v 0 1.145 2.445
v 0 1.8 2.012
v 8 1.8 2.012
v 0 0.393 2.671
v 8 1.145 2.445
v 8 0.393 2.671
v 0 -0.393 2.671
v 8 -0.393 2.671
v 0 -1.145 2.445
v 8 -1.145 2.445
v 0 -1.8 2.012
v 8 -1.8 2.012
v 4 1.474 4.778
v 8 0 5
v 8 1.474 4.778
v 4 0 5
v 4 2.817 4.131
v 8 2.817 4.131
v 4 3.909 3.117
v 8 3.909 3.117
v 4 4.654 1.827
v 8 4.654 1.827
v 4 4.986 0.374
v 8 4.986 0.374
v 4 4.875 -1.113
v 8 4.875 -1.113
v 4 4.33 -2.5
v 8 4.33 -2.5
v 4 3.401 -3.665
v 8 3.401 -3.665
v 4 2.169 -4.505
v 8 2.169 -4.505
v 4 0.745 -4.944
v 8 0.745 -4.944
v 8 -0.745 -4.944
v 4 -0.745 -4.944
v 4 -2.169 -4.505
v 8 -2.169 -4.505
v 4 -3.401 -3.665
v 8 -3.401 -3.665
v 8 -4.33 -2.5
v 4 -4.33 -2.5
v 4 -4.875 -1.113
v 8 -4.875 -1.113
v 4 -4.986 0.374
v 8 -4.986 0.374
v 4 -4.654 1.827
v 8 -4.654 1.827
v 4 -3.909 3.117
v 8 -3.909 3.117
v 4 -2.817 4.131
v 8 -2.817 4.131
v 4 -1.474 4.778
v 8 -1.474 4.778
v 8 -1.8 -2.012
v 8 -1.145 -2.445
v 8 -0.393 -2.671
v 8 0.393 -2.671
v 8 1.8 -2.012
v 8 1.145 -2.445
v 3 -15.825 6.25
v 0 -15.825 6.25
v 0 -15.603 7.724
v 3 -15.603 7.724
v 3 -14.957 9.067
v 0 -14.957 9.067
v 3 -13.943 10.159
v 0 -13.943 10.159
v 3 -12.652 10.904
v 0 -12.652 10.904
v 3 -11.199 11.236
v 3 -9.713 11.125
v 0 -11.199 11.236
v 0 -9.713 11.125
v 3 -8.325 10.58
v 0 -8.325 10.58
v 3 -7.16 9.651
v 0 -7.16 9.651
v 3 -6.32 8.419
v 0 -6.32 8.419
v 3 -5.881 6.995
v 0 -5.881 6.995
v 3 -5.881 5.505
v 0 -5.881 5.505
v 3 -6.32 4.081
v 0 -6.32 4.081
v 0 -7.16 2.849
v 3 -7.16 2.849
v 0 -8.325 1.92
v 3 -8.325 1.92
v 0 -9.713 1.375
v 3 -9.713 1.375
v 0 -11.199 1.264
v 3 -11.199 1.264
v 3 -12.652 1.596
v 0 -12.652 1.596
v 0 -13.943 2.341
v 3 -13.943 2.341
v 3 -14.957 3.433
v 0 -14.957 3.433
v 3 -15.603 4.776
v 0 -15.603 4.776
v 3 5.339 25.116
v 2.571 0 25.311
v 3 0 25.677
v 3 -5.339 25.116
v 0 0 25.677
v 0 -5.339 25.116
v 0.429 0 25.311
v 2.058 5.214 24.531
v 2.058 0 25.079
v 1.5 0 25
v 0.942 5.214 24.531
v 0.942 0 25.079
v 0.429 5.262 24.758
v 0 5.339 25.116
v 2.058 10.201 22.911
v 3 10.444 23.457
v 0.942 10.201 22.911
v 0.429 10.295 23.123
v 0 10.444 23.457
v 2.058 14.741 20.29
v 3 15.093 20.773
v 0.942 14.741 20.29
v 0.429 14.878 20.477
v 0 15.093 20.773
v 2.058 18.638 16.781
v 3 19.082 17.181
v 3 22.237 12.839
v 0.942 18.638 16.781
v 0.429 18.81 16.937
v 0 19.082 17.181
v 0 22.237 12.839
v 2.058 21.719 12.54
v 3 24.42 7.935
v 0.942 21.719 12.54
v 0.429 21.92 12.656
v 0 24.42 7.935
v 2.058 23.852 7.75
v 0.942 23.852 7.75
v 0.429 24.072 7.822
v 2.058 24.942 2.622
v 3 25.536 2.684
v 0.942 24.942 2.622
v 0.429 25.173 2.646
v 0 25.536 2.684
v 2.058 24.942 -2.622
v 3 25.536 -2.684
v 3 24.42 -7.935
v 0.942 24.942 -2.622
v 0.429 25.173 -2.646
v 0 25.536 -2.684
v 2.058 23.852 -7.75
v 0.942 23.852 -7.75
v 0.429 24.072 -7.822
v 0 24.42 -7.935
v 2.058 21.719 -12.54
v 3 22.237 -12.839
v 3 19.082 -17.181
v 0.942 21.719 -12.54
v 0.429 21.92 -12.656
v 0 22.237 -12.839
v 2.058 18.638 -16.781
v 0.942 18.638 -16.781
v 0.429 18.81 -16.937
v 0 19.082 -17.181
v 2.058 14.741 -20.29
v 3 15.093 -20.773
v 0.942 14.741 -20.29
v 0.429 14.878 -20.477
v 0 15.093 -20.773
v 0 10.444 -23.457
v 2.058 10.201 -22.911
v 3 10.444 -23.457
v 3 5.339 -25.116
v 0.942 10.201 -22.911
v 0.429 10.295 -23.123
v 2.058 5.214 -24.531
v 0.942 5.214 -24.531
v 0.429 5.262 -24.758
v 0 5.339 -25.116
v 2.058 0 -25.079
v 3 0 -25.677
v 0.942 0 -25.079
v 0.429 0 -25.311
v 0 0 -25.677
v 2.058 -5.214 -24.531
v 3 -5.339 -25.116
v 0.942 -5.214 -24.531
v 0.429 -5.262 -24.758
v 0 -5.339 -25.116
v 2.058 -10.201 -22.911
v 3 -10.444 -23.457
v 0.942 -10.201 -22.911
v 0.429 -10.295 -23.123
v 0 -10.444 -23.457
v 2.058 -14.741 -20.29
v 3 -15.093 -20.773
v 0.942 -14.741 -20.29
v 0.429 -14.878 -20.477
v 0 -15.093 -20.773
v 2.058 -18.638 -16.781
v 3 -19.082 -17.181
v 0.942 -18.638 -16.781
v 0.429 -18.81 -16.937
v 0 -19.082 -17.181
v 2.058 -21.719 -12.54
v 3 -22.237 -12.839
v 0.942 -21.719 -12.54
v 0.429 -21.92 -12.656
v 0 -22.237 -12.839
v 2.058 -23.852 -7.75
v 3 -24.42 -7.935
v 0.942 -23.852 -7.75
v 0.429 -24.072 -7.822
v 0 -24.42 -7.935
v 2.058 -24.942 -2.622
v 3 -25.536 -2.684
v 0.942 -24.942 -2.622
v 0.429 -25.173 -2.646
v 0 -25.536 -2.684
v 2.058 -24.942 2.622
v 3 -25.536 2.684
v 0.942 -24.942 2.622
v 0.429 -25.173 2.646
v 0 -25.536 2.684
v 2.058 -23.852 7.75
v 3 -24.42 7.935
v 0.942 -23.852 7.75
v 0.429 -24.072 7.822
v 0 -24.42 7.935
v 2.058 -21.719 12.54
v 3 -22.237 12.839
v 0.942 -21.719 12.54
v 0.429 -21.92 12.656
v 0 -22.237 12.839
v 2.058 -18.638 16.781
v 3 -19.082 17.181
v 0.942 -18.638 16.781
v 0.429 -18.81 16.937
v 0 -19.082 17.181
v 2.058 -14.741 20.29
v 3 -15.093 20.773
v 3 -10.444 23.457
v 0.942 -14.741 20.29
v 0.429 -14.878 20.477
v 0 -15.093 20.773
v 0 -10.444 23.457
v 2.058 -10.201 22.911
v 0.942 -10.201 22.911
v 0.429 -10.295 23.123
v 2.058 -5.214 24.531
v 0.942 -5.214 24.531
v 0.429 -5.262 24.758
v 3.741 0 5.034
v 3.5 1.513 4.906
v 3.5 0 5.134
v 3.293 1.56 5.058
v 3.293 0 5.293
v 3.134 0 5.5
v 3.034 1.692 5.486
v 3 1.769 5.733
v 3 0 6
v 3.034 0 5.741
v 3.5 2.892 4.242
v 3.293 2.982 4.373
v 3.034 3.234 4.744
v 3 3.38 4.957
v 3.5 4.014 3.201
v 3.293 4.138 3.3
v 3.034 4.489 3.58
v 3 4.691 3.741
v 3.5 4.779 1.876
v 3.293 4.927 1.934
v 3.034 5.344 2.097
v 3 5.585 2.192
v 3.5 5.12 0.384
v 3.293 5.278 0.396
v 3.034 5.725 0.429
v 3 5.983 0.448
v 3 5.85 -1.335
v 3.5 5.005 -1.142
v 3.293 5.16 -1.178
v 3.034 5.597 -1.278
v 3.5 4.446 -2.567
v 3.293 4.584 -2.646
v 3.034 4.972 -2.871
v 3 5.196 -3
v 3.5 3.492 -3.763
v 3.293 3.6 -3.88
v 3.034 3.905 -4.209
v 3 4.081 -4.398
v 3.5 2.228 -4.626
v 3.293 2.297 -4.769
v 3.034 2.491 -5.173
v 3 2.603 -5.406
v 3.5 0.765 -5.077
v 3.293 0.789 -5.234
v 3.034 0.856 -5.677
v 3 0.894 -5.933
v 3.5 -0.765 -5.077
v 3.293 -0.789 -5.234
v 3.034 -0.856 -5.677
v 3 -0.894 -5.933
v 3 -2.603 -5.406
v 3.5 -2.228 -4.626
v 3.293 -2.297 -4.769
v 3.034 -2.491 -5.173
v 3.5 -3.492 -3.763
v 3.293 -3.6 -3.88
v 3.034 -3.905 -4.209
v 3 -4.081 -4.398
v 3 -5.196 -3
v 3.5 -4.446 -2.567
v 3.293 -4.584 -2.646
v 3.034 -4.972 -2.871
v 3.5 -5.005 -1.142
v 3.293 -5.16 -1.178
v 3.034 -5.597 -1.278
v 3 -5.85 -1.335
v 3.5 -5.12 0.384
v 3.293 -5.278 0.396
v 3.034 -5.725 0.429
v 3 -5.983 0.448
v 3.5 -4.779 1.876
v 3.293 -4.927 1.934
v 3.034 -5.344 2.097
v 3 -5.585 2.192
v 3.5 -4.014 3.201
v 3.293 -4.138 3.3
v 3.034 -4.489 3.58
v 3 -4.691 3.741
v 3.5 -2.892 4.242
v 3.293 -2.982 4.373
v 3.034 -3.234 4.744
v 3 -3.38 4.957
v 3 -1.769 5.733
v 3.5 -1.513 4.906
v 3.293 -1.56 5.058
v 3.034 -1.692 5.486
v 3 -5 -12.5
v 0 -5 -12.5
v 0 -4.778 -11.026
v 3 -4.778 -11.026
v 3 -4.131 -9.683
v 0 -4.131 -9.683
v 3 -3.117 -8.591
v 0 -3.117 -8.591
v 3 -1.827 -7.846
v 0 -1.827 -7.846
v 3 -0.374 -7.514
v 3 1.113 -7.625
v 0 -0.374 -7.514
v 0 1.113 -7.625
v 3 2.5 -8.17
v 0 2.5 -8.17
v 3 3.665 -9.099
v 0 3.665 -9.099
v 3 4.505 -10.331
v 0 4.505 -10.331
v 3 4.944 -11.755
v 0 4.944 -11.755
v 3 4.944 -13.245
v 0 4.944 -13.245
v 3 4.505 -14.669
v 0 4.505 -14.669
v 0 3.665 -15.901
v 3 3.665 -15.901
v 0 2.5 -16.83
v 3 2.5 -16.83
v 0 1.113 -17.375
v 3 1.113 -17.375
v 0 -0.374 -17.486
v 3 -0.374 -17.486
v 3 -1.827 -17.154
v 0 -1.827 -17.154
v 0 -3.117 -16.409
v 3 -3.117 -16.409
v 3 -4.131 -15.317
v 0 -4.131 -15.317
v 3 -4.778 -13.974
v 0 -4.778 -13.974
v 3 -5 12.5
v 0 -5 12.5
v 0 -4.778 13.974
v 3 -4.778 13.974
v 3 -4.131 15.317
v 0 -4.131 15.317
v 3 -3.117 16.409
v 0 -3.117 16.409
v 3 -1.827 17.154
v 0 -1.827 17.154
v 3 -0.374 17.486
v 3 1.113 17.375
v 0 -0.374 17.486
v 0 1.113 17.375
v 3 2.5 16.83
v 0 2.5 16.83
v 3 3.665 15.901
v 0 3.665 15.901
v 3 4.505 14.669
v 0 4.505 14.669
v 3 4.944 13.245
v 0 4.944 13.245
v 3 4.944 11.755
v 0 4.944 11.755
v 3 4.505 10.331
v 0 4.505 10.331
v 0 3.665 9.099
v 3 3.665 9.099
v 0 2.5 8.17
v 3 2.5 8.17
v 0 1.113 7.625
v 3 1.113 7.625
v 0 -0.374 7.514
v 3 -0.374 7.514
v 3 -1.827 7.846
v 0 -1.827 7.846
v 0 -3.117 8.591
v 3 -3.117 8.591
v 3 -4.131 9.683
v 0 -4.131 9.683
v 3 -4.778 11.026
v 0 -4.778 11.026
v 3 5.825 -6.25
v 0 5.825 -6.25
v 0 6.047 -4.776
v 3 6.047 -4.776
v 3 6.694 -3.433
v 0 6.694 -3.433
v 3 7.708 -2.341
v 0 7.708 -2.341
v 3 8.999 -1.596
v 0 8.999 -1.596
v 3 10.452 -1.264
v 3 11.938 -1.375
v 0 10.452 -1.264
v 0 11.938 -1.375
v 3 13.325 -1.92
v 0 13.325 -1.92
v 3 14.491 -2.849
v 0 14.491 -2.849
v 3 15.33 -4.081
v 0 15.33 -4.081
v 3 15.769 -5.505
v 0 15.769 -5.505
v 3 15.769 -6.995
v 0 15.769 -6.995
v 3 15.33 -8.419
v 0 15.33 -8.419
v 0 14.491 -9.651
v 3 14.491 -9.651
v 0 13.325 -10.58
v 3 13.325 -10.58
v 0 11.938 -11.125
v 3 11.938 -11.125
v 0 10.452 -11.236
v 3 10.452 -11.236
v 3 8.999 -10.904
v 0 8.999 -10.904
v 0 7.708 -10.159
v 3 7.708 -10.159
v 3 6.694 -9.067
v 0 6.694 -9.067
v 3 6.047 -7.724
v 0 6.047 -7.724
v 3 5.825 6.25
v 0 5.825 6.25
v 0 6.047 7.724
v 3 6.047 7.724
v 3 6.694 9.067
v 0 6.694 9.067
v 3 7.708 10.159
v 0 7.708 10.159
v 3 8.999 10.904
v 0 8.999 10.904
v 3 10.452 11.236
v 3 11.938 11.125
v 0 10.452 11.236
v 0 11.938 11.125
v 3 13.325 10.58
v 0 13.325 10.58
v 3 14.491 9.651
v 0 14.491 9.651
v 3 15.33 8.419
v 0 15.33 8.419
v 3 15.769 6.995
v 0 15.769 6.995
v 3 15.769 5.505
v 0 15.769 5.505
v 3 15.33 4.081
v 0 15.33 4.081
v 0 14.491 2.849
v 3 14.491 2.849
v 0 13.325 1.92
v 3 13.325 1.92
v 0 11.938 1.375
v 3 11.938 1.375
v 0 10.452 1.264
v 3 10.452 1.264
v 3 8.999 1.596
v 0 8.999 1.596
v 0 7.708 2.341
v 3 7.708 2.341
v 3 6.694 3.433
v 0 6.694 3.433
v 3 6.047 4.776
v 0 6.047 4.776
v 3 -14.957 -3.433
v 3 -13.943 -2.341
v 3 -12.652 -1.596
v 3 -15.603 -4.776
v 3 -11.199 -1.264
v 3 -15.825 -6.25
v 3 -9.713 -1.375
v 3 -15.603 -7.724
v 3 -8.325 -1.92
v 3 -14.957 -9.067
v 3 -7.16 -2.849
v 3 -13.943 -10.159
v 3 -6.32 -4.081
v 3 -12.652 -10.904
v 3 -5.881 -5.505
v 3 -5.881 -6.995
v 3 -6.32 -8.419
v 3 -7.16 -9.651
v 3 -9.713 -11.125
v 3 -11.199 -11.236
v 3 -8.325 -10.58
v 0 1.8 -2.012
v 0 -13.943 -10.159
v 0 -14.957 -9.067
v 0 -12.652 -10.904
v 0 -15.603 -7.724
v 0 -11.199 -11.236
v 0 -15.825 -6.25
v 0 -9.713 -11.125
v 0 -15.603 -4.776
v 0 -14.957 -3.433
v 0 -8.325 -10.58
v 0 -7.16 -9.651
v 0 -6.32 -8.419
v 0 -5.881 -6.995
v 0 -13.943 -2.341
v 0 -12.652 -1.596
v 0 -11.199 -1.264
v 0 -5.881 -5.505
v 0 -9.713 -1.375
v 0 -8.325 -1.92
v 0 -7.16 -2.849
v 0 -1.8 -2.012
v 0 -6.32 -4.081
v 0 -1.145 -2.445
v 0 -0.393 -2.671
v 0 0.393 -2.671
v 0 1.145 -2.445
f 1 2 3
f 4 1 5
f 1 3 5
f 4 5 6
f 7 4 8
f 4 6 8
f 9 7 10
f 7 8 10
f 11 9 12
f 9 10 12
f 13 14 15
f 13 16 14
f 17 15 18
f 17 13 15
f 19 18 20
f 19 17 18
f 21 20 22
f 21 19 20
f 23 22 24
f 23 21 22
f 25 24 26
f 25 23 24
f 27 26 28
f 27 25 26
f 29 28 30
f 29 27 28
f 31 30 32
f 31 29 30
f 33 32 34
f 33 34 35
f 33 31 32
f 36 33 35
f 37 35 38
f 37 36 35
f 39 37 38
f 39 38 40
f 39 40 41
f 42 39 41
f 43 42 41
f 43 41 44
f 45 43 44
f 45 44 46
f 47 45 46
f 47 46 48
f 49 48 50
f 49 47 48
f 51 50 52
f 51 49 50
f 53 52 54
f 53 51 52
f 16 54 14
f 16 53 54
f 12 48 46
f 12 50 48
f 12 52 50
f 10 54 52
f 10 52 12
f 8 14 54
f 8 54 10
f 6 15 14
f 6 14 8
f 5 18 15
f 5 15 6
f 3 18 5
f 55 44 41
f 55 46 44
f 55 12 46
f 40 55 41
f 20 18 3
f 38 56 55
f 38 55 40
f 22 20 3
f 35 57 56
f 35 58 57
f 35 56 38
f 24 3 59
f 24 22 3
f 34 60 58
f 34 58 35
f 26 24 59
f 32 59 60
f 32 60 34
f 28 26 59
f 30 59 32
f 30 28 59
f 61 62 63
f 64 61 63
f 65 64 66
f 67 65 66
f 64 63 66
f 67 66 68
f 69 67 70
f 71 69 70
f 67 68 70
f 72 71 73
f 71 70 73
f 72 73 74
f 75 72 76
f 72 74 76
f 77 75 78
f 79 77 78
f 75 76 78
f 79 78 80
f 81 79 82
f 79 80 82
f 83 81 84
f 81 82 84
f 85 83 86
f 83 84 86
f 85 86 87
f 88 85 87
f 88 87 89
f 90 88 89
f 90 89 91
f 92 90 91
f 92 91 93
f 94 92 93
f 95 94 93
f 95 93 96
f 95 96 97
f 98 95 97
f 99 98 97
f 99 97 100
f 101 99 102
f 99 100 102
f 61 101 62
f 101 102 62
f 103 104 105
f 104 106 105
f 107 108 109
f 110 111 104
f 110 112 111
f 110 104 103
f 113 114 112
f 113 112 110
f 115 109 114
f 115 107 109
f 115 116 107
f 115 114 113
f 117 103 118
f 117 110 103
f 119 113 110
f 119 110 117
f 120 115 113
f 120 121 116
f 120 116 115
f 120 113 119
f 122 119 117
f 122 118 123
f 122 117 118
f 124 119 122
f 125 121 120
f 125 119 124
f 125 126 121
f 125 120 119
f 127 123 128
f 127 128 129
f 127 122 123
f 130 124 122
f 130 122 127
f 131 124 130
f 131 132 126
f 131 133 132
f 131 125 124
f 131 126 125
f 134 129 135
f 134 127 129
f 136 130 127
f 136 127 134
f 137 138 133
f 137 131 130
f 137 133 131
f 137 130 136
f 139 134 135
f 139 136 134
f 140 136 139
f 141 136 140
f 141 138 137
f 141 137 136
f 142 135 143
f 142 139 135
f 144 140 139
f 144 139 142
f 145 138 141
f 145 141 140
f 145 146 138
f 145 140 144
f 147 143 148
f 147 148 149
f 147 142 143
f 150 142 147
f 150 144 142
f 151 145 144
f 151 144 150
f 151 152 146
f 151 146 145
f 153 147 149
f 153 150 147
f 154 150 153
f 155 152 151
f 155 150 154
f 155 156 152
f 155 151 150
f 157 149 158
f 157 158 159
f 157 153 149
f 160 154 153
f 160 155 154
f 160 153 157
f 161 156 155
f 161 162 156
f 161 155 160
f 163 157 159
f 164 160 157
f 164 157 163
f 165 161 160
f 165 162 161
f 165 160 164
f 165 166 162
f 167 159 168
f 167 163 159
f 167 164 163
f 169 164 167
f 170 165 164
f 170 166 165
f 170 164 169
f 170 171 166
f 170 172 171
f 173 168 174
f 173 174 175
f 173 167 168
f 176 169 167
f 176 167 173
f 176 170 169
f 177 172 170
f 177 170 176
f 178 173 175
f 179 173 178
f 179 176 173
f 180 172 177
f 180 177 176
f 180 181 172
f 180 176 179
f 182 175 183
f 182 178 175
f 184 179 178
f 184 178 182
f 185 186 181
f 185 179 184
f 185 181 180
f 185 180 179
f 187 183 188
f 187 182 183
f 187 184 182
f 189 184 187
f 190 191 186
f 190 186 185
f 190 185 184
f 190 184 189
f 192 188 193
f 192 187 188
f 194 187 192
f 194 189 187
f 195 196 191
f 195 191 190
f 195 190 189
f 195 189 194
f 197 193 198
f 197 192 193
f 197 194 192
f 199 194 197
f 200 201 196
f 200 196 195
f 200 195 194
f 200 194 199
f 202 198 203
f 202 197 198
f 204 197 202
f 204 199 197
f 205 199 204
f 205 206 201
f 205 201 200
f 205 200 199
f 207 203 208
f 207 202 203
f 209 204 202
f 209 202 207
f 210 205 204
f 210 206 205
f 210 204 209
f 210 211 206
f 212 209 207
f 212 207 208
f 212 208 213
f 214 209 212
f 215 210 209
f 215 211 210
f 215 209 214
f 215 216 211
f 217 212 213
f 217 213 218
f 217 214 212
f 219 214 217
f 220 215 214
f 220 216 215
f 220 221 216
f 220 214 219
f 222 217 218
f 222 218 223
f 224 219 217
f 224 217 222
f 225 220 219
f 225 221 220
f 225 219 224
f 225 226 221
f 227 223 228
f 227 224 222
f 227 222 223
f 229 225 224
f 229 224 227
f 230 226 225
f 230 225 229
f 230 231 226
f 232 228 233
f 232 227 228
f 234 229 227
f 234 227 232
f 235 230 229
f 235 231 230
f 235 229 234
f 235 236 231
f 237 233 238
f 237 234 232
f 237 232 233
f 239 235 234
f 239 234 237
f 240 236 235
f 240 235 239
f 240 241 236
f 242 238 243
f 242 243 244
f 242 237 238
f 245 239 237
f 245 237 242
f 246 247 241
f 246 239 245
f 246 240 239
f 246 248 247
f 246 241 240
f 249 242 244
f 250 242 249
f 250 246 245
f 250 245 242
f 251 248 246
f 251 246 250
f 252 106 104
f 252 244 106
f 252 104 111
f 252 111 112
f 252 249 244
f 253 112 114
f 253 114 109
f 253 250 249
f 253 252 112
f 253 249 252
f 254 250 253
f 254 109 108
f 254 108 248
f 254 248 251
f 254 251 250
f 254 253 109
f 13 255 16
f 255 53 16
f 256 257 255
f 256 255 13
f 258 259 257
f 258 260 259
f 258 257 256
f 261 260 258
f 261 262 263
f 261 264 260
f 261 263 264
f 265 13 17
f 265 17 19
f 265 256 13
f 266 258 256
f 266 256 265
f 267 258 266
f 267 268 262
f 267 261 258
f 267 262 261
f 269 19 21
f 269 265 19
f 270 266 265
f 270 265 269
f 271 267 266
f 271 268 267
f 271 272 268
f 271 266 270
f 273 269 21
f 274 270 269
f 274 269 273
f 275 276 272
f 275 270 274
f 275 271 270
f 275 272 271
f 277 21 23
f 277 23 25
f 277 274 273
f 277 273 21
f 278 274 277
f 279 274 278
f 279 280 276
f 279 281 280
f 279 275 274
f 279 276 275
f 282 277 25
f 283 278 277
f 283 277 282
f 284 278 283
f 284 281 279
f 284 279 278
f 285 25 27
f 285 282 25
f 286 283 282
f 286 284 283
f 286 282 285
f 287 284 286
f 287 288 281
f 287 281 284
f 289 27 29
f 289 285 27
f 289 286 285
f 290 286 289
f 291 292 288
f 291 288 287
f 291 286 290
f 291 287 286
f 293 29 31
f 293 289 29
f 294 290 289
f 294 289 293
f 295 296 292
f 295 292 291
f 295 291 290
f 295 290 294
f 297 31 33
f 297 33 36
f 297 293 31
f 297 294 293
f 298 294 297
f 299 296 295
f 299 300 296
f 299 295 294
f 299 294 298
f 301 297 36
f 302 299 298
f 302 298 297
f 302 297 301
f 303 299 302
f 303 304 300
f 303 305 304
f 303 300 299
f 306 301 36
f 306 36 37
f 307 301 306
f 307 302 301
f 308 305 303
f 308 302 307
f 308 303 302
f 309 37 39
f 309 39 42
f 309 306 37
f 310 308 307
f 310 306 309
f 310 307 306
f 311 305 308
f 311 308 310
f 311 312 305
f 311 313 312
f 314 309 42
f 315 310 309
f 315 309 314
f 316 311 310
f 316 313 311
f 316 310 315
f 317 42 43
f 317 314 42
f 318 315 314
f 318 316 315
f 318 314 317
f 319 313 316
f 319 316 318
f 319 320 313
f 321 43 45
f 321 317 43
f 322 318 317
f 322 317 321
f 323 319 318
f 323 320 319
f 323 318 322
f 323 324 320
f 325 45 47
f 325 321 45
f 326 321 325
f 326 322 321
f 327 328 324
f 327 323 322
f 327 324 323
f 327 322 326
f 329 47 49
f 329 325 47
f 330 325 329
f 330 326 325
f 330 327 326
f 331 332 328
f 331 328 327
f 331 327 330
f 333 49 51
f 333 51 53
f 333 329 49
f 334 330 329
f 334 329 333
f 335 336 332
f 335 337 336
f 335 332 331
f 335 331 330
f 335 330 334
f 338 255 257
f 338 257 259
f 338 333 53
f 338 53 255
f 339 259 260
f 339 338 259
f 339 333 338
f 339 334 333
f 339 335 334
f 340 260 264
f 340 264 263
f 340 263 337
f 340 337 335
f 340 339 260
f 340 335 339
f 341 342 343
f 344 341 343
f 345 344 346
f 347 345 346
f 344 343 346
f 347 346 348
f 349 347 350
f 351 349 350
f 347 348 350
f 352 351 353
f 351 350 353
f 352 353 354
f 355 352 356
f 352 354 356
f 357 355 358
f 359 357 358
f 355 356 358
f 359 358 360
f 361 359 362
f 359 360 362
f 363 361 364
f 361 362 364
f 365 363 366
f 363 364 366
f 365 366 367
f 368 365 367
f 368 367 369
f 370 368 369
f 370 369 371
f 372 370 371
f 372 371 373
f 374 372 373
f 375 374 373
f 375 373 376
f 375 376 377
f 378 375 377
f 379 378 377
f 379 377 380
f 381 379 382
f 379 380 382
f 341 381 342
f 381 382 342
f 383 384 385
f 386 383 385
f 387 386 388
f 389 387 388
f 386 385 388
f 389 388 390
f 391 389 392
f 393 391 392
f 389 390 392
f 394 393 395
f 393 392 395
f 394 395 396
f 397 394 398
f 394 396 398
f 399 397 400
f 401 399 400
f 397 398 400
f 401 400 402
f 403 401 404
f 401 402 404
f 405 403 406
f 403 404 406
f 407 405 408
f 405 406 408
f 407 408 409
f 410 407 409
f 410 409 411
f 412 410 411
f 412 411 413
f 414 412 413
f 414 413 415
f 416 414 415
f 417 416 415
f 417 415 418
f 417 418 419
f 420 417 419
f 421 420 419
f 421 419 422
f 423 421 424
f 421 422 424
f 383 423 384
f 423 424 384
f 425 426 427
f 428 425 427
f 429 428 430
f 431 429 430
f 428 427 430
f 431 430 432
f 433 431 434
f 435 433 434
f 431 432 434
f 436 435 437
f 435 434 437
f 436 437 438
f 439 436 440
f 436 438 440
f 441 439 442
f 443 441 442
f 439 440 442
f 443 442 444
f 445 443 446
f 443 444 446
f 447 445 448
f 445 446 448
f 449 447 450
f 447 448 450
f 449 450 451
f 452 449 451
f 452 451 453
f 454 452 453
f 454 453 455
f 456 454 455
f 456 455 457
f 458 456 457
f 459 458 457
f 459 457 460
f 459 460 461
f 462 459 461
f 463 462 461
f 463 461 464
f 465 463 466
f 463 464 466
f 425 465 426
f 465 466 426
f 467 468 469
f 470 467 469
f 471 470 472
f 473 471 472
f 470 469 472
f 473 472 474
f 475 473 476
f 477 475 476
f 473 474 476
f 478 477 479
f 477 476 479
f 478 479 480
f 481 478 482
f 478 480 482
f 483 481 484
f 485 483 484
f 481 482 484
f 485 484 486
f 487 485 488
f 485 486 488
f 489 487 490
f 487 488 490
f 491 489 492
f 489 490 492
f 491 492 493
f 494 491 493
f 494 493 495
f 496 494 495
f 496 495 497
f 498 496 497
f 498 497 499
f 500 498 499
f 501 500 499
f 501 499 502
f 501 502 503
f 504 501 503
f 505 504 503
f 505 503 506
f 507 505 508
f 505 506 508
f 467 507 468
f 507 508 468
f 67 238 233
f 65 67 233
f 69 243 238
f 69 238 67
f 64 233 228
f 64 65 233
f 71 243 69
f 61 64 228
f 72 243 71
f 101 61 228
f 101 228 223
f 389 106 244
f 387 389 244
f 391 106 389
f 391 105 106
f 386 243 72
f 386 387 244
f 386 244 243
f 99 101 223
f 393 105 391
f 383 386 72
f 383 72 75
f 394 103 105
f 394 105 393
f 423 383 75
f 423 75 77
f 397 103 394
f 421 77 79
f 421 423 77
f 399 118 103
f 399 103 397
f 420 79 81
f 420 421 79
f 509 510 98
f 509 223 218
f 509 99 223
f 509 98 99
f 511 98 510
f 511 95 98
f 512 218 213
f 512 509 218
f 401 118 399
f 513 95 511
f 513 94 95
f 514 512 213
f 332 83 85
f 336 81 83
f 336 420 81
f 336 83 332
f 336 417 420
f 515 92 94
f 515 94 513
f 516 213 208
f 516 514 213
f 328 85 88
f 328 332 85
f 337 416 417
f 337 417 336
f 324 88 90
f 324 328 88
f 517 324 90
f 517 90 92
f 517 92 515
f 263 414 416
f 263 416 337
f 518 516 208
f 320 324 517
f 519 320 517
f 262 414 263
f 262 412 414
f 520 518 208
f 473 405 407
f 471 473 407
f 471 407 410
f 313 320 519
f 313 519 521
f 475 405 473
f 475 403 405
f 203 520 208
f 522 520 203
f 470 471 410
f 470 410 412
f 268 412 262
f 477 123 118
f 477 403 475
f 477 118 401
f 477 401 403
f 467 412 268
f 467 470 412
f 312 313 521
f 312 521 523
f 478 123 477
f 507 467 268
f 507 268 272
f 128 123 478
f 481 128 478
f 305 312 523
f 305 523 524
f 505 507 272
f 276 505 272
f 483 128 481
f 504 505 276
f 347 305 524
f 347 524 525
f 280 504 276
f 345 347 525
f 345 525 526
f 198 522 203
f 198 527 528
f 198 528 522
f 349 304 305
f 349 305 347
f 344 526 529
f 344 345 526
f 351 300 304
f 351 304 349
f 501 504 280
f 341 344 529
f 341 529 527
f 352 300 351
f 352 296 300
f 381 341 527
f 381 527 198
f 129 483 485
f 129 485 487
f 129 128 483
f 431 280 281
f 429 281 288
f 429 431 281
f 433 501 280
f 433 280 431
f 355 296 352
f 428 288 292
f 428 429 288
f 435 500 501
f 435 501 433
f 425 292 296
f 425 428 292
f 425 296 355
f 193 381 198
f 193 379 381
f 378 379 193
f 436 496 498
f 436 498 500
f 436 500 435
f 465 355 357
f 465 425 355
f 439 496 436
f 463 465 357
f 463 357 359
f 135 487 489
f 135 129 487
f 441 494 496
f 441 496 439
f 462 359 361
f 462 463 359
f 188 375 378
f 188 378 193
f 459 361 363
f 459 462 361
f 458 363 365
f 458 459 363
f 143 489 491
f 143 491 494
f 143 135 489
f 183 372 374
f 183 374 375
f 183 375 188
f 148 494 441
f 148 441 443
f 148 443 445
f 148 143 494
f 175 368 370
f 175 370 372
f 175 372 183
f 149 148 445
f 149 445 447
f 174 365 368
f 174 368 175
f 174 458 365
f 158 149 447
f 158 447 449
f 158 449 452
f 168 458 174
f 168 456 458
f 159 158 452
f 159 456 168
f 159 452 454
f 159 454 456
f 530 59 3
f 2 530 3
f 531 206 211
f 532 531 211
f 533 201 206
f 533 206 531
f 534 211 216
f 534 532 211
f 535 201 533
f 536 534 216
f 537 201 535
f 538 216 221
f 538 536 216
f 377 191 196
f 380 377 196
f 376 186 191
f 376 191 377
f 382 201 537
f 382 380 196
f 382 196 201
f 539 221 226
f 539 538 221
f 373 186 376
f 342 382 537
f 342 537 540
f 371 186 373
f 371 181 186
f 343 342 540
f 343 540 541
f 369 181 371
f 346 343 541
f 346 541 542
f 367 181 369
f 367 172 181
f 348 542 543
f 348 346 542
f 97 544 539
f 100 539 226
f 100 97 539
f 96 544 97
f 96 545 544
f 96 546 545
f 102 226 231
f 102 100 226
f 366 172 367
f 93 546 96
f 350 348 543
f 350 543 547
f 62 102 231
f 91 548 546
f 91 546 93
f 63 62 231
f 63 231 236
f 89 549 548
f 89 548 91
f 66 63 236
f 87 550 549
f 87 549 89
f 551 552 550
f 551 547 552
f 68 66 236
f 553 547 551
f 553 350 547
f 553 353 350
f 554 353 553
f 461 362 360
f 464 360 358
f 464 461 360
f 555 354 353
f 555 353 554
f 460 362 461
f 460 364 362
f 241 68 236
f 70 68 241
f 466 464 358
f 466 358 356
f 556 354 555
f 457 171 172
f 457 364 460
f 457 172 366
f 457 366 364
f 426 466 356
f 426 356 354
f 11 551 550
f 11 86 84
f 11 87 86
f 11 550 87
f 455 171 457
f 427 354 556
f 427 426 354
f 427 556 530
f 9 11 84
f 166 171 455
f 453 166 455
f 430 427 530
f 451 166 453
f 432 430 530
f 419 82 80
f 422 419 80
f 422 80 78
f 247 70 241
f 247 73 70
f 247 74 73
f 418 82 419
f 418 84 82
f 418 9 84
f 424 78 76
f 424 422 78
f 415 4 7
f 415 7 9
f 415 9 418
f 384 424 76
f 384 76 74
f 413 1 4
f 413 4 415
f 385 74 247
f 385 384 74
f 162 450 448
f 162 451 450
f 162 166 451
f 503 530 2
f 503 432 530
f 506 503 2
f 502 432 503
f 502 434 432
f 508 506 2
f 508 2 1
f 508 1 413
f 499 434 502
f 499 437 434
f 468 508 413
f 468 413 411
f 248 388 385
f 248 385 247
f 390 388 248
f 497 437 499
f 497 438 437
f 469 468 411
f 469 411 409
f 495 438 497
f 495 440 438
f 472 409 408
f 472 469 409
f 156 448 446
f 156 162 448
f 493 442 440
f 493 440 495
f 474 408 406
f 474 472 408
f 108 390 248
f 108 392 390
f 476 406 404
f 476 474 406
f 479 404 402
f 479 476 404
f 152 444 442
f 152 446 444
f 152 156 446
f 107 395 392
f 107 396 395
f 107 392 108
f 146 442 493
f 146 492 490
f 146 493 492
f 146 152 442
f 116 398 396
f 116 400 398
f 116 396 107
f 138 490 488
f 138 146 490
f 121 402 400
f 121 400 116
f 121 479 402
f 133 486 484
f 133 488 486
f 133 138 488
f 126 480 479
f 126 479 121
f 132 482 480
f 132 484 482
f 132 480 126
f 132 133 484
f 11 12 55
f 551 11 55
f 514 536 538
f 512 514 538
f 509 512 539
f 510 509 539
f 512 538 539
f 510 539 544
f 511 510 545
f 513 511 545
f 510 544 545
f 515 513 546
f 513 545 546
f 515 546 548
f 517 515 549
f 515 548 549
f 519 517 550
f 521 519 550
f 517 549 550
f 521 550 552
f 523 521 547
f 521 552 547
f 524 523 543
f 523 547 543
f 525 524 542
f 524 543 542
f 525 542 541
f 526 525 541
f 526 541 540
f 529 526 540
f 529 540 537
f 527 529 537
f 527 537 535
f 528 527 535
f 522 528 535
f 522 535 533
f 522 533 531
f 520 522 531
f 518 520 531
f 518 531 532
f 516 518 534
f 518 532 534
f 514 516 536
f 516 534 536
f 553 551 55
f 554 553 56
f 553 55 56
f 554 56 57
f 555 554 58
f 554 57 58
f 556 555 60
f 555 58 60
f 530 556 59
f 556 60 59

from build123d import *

# Parameters (mm, degrees)
F1_FACE1_R = 25.6771243445
F3_DEPTH   = 8
F4_R       = 5
F5_DEPTH   = 3


with BuildPart() as f1:
    # F0 (on Front) → F1 (revolve)
    with BuildSketch(Plane.XZ):
        with BuildLine():
            Line((0, 25.6771243445), (0, 0))
            Line((0, 0), (3, 0))
            Line((3, 0), (8, 0))
            Line((8, 0), (8, 5))
            Line((8, 5), (4, 5))
            ThreePointArc((4, 5), (3.2928932188, 5.2928932188), (3, 6))
            Line((3, 6), (3, 25.6771243445))
            ThreePointArc((3, 25.6771243445), (1.5, 25), (0, 25.6771243445))
        make_face()
    revolve(axis=Axis((1.5, 0, 0), (-1, 0, 0)))

    # F2 (on face) + F1_face1 (on face) → F3 (cut)
    with BuildSketch(Plane.YZ.offset(8)):
        with BuildLine():
            Line((-1.8, 2.0124611797), (-1.8, -2.0124611797))
            ThreePointArc((-1.8, -2.0124611797), (0, -2.7), (1.8, -2.0124611797))
            Line((1.8, -2.0124611797), (1.8, 2.0124611797))
            ThreePointArc((1.8, 2.0124611797), (0, 2.7), (-1.8, 2.0124611797))
        make_face()
    with BuildSketch(Plane(origin=(0, 0, 0), x_dir=(0, -1, 0), z_dir=(-1, 0, 0))):
        Circle(F1_FACE1_R)
    extrude(amount=-F3_DEPTH, dir=(1, 0, 0), mode=Mode.SUBTRACT)

    # F4 (on face) → F5 (cut, through all)
    with BuildSketch(Plane(origin=(0, 0, 0), x_dir=(0, -1, 0), z_dir=(-1, 0, 0))):
        with Locations((0, 12.5)):
            Circle(F4_R)
        with Locations((10.8253175473, 6.25)):
            Circle(F4_R)
        with Locations((10.8253175473, -6.25)):
            Circle(F4_R)
        with Locations((0, -12.5)):
            Circle(F4_R)
        with Locations((-10.8253175473, -6.25)):
            Circle(F4_R)
        with Locations((-10.8253175473, 6.25)):
            Circle(F4_R)
    extrude(amount=-F5_DEPTH, mode=Mode.SUBTRACT)


solid = f1.part
